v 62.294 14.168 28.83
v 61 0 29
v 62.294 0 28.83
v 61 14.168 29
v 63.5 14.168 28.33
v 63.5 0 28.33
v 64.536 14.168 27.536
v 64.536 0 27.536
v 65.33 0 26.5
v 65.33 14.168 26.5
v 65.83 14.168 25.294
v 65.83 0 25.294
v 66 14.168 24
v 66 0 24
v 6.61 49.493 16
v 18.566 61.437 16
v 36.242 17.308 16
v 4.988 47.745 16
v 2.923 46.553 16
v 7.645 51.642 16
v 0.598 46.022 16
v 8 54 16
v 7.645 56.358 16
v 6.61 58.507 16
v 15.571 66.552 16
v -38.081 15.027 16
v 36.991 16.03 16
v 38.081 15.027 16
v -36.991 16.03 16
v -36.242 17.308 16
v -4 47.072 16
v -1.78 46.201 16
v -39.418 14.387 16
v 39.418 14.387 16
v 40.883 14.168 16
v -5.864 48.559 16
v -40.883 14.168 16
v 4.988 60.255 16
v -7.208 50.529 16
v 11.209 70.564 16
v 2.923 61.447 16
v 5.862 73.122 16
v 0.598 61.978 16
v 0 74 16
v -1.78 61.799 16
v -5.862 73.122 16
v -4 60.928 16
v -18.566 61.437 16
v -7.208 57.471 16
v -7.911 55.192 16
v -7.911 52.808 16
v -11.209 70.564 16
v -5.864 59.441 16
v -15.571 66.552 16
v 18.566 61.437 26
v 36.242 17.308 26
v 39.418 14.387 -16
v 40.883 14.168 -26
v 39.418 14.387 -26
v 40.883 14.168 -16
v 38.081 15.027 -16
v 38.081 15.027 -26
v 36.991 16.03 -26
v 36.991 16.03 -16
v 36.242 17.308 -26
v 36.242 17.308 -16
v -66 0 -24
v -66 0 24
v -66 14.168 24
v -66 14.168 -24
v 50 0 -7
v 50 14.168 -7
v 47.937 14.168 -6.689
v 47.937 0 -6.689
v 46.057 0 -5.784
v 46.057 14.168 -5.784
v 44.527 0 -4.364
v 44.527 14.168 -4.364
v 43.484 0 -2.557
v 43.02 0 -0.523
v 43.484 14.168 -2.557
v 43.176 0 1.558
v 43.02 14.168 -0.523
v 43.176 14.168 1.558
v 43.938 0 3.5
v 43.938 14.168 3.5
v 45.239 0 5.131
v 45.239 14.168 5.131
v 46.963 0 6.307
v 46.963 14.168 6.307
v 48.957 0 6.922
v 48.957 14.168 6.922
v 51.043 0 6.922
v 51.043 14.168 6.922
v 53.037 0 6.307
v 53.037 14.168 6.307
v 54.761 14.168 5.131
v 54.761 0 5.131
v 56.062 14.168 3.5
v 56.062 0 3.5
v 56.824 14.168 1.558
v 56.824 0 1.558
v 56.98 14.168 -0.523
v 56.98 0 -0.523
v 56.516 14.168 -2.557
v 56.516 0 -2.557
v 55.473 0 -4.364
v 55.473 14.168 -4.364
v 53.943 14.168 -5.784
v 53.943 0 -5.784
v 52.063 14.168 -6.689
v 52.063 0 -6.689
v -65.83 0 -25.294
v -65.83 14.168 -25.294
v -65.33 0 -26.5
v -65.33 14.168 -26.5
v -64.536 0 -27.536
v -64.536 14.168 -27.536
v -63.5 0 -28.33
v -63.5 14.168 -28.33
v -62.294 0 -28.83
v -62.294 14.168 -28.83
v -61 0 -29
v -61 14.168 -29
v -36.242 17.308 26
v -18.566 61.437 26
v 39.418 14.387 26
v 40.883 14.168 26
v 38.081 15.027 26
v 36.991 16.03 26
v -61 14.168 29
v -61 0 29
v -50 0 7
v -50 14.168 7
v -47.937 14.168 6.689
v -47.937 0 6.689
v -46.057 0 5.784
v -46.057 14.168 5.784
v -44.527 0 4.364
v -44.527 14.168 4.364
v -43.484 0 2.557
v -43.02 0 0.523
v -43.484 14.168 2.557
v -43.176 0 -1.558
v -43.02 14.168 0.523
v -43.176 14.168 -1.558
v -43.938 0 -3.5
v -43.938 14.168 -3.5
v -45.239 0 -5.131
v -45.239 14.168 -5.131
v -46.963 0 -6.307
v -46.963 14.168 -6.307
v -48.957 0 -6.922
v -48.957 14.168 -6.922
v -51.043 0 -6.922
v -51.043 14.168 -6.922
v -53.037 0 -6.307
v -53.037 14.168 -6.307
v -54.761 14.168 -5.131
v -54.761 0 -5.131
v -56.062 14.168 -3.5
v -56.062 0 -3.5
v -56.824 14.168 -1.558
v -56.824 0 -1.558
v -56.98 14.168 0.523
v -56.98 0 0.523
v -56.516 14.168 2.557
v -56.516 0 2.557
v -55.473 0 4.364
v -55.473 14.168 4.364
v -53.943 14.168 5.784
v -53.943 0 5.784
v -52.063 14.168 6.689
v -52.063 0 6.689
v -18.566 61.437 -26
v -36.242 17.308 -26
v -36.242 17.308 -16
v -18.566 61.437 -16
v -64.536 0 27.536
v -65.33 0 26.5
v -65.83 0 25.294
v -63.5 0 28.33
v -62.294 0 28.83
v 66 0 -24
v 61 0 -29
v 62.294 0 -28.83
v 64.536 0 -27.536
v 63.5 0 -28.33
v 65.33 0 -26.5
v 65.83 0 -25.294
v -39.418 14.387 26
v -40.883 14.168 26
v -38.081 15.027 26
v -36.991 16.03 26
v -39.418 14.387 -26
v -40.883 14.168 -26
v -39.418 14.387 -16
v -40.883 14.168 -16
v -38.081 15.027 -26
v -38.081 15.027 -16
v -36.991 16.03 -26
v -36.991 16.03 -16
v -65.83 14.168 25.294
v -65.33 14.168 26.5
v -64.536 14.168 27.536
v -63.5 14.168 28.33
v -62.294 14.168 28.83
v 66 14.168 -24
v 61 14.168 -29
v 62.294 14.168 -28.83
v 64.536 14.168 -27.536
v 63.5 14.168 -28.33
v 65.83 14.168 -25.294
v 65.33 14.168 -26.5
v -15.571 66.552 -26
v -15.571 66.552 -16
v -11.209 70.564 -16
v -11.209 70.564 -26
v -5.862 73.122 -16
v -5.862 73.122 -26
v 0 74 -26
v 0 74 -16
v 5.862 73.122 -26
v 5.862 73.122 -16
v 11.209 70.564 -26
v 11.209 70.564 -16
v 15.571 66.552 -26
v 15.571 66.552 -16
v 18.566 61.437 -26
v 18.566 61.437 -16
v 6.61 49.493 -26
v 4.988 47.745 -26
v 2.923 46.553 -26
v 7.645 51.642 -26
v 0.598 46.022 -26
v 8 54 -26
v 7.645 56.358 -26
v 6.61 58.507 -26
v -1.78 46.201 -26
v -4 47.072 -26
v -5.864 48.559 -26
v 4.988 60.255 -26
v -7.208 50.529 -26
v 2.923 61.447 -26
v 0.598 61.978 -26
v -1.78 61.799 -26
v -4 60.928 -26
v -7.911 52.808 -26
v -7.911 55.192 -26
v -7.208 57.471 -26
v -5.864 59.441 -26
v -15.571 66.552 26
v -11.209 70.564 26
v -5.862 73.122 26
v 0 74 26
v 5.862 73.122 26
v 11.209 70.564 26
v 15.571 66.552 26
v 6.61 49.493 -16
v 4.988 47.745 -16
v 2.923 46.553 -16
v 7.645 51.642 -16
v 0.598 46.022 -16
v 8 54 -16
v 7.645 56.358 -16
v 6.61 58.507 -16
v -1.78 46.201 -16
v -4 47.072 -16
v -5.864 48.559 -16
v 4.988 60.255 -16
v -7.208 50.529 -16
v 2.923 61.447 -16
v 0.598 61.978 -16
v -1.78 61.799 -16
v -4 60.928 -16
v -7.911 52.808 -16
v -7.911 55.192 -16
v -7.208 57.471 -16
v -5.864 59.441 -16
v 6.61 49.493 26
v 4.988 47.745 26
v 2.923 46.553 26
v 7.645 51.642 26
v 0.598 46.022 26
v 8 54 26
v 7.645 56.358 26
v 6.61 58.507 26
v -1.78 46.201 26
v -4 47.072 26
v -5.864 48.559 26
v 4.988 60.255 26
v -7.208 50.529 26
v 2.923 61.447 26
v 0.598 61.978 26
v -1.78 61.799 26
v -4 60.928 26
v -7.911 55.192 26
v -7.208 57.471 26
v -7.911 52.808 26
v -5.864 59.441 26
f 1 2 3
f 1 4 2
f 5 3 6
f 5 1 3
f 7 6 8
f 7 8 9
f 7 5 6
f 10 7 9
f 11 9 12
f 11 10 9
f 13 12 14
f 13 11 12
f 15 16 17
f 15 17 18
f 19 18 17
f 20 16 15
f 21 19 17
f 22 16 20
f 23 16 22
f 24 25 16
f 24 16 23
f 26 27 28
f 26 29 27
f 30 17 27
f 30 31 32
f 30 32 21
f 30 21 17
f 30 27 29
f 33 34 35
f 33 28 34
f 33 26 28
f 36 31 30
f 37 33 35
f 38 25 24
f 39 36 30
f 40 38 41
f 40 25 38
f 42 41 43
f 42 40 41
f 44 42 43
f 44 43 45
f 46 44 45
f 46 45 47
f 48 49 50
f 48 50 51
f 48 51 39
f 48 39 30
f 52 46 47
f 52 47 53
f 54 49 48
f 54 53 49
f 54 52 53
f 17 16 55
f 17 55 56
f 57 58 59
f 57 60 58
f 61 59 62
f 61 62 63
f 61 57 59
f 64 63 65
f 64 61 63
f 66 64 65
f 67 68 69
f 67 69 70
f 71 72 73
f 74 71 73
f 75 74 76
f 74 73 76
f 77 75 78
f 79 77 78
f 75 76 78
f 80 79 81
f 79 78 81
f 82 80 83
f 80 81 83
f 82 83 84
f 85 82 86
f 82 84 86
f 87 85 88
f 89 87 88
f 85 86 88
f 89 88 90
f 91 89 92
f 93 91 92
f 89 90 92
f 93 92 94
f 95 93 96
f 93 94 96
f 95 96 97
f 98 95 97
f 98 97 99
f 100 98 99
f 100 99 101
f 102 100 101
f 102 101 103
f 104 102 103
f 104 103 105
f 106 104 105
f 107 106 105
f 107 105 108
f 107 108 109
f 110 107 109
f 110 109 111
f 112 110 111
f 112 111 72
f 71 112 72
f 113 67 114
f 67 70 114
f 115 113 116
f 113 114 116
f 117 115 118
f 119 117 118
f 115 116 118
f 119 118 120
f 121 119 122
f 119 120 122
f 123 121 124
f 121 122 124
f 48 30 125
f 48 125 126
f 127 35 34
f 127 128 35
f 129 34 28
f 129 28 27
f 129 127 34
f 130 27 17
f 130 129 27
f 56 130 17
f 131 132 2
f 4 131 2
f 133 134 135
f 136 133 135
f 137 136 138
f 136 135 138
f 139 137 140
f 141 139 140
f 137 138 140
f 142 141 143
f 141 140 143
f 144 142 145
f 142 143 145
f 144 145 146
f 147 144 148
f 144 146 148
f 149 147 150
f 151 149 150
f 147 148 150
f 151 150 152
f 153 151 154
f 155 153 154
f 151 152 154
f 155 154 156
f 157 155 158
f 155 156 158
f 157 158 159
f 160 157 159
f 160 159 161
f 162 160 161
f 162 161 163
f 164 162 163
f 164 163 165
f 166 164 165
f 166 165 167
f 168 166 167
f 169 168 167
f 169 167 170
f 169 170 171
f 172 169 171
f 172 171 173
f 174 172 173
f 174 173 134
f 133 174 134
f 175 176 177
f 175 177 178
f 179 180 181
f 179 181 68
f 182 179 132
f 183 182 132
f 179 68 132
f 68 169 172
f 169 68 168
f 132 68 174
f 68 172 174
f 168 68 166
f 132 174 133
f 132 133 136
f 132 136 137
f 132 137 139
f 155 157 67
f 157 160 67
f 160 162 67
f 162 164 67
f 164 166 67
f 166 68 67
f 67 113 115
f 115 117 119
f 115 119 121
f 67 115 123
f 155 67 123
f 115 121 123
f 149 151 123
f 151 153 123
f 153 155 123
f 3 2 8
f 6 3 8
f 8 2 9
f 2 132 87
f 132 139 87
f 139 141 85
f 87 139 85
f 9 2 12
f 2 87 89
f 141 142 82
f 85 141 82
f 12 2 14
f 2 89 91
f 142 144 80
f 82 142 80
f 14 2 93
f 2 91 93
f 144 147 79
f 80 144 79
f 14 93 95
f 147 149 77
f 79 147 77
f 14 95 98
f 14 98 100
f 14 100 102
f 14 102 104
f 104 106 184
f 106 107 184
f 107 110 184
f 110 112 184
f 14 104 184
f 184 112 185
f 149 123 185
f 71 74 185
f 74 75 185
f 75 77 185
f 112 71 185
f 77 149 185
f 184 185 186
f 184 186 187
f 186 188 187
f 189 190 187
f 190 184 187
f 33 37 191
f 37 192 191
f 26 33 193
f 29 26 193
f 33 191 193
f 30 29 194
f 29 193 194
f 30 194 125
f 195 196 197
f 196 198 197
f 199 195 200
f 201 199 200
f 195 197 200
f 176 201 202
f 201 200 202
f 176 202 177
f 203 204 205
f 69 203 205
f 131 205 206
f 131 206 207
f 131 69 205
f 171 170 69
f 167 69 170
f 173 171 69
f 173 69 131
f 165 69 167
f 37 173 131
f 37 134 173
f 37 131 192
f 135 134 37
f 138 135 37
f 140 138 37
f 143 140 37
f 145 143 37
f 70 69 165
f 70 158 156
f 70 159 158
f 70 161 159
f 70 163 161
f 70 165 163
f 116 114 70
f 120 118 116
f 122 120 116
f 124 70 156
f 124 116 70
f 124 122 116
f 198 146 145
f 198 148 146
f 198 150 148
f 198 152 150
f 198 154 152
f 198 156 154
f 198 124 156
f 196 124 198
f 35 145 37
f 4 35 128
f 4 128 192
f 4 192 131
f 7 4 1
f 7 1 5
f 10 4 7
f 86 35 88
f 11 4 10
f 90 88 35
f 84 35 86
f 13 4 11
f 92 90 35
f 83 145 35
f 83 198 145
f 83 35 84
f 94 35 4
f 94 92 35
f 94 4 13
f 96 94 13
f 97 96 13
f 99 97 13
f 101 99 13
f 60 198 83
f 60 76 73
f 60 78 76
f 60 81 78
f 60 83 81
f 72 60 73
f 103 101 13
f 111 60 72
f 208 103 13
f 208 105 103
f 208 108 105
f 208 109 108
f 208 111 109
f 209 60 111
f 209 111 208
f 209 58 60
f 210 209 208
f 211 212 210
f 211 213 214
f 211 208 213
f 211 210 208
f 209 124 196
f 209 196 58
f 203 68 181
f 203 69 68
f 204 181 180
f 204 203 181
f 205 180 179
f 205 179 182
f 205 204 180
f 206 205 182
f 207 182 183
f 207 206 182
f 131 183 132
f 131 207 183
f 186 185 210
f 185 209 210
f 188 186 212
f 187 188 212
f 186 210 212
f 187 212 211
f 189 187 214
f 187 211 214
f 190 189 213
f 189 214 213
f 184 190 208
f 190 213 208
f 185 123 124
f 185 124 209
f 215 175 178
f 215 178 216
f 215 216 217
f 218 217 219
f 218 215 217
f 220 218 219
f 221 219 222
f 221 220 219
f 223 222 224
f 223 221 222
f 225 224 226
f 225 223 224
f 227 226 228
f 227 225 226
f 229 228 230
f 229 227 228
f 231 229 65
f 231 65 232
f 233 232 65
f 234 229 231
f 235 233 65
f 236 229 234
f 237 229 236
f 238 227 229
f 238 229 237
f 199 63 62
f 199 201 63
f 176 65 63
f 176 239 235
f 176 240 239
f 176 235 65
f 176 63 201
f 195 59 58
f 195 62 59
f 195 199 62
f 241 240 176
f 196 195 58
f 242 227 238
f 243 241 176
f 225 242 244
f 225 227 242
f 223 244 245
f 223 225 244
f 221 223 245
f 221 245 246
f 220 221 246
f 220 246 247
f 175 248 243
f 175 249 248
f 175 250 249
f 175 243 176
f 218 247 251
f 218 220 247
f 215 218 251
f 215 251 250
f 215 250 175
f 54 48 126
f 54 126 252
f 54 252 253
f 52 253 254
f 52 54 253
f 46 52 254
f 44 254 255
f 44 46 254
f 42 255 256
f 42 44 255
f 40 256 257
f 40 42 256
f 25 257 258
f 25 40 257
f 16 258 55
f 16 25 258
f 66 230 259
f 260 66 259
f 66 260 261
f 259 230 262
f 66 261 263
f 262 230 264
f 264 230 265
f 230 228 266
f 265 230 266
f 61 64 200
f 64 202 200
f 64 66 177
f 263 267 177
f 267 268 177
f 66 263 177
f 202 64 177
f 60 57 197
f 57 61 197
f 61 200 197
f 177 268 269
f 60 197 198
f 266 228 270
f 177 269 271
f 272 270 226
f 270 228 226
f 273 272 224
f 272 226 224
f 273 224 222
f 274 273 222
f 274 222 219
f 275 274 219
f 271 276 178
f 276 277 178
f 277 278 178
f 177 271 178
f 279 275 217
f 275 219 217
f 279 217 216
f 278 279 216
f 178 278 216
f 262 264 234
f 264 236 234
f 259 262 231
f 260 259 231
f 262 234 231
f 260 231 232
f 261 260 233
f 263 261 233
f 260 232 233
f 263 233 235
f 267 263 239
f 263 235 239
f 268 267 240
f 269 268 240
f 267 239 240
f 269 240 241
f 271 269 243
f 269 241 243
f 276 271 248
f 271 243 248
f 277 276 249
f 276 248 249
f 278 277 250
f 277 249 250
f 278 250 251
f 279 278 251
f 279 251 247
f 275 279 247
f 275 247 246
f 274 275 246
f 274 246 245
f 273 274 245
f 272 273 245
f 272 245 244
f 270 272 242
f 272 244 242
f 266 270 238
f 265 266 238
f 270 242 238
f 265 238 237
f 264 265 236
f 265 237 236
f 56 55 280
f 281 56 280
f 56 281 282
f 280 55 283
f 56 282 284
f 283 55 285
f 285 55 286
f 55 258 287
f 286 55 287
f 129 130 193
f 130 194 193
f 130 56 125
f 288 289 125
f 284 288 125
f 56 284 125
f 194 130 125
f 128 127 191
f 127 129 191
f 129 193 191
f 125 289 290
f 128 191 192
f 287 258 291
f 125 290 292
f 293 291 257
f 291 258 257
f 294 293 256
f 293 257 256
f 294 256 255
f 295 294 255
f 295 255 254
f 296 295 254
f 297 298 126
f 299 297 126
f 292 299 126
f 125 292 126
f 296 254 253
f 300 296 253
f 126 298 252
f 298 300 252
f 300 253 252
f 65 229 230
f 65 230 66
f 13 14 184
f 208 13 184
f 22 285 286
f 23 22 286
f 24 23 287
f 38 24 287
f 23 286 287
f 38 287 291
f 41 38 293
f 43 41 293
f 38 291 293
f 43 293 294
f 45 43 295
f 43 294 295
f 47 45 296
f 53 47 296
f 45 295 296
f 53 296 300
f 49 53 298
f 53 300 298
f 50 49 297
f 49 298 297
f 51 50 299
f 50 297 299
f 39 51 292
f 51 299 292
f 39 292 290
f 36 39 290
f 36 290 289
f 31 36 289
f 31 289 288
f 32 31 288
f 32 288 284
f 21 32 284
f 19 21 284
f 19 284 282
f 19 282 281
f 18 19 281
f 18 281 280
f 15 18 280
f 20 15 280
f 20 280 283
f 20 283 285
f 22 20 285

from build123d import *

# Parameters (mm, degrees)
SKETCH1_W           = 132
SKETCH1_H           = 58
BOSS_EXTRUDE1_DEPTH = 14.167595312
SKETCH2_R           = 7
CUT_EXTRUDE1_DEPTH  = 74.469182362
BOSS_EXTRUDE2_START = 16
BOSS_EXTRUDE2_DEPTH = 10
CUT_EXTRUDE2_REACH  = 115.389
SKETCH4_R           = 8
BOSS_EXTRUDE3_START = -26
BOSS_EXTRUDE3_DEPTH = 10
CUT_EXTRUDE3_REACH  = 115.389
SKETCH5_R           = 8
FILLET1_R           = 5


with BuildPart() as part:
    # Sketch1 → Boss-Extrude1 (new body)
    with BuildSketch(Plane(origin=(0, 0, 0), x_dir=(1, 0, 0), z_dir=(0, 1, 0))):
        Rectangle(SKETCH1_W, SKETCH1_H)
    extrude(amount=BOSS_EXTRUDE1_DEPTH)

    # Sketch2 → Cut-Extrude1 (cut, through all)
    with BuildSketch(Plane(origin=(0, 14.167595312, 0), x_dir=(1, 0, 0), z_dir=(0, 1, 0))):
        with Locations((-50, 0)):
            Circle(SKETCH2_R)
        with Locations((50, 0)):
            Circle(SKETCH2_R)
    extrude(amount=-CUT_EXTRUDE1_DEPTH, mode=Mode.SUBTRACT)

    # Sketch3 → Boss-Extrude2 (add)
    with BuildSketch(Plane.XY.offset(BOSS_EXTRUDE2_START)):
        with BuildLine():
            Line((37.5, 14.167595312), (-37.5, 14.167595312))
            Line((-37.5, 14.167595312), (-18.565958618, 61.436745296))
            ThreePointArc((-18.565958618, 61.436745296), (0, 74), (18.565958618, 61.436745296))
            Line((18.565958618, 61.436745296), (37.5, 14.167595312))
        make_face()
    extrude(amount=BOSS_EXTRUDE2_DEPTH)

    # Sketch4 → Cut-Extrude2 (cut, up to next)
    with BuildSketch(Plane.XY.offset(26), mode=Mode.PRIVATE) as cut_extrude2_sk1:
        with Locations((0, 54)):
            Circle(SKETCH4_R)
    cut_extrude2_tool1 = extrude(cut_extrude2_sk1.sketch, amount=-CUT_EXTRUDE2_REACH, mode=Mode.PRIVATE) & part.part
    add(cut_extrude2_tool1.solids().sort_by_distance((0, 54, 26))[0], mode=Mode.SUBTRACT)

    # Sketch3<2> → Boss-Extrude3 (add)
    with BuildSketch(Plane.XY.offset(BOSS_EXTRUDE3_START)):
        with BuildLine():
            Line((37.5, 14.167595312), (-37.5, 14.167595312))
            Line((-37.5, 14.167595312), (-18.565958618, 61.436745296))
            ThreePointArc((-18.565958618, 61.436745296), (0, 74), (18.565958618, 61.436745296))
            Line((18.565958618, 61.436745296), (37.5, 14.167595312))
        make_face()
    extrude(amount=BOSS_EXTRUDE3_DEPTH)

    # Sketch5 → Cut-Extrude3 (cut, up to next)
    with BuildSketch(Plane(origin=(0, 0, -26), x_dir=(-1, 0, 0), z_dir=(0, 0, -1)), mode=Mode.PRIVATE) as cut_extrude3_sk1:
        with Locations((0, 54)):
            Circle(SKETCH5_R)
    cut_extrude3_tool1 = extrude(cut_extrude3_sk1.sketch, amount=-CUT_EXTRUDE3_REACH, mode=Mode.PRIVATE) & part.part
    add(cut_extrude3_tool1.solids().sort_by_distance((0, 54, -26))[0], mode=Mode.SUBTRACT)

    # Fillet1
    fillet1_edges = [part.edges().sort_by_distance(p)[0] for p in [
        (-37.5, 14.167595312, -21),
        (37.5, 14.167595312, -21),
        (37.5, 14.167595312, 21),
        (-37.5, 14.167595312, 21),
        (-66, 7.083797656, -29),
        (66, 7.083797656, -29),
        (-66, 7.083797656, 29),
        (66, 7.083797656, 29),
    ]]
    fillet(fillet1_edges, radius=FILLET1_R)


solid = part.part
